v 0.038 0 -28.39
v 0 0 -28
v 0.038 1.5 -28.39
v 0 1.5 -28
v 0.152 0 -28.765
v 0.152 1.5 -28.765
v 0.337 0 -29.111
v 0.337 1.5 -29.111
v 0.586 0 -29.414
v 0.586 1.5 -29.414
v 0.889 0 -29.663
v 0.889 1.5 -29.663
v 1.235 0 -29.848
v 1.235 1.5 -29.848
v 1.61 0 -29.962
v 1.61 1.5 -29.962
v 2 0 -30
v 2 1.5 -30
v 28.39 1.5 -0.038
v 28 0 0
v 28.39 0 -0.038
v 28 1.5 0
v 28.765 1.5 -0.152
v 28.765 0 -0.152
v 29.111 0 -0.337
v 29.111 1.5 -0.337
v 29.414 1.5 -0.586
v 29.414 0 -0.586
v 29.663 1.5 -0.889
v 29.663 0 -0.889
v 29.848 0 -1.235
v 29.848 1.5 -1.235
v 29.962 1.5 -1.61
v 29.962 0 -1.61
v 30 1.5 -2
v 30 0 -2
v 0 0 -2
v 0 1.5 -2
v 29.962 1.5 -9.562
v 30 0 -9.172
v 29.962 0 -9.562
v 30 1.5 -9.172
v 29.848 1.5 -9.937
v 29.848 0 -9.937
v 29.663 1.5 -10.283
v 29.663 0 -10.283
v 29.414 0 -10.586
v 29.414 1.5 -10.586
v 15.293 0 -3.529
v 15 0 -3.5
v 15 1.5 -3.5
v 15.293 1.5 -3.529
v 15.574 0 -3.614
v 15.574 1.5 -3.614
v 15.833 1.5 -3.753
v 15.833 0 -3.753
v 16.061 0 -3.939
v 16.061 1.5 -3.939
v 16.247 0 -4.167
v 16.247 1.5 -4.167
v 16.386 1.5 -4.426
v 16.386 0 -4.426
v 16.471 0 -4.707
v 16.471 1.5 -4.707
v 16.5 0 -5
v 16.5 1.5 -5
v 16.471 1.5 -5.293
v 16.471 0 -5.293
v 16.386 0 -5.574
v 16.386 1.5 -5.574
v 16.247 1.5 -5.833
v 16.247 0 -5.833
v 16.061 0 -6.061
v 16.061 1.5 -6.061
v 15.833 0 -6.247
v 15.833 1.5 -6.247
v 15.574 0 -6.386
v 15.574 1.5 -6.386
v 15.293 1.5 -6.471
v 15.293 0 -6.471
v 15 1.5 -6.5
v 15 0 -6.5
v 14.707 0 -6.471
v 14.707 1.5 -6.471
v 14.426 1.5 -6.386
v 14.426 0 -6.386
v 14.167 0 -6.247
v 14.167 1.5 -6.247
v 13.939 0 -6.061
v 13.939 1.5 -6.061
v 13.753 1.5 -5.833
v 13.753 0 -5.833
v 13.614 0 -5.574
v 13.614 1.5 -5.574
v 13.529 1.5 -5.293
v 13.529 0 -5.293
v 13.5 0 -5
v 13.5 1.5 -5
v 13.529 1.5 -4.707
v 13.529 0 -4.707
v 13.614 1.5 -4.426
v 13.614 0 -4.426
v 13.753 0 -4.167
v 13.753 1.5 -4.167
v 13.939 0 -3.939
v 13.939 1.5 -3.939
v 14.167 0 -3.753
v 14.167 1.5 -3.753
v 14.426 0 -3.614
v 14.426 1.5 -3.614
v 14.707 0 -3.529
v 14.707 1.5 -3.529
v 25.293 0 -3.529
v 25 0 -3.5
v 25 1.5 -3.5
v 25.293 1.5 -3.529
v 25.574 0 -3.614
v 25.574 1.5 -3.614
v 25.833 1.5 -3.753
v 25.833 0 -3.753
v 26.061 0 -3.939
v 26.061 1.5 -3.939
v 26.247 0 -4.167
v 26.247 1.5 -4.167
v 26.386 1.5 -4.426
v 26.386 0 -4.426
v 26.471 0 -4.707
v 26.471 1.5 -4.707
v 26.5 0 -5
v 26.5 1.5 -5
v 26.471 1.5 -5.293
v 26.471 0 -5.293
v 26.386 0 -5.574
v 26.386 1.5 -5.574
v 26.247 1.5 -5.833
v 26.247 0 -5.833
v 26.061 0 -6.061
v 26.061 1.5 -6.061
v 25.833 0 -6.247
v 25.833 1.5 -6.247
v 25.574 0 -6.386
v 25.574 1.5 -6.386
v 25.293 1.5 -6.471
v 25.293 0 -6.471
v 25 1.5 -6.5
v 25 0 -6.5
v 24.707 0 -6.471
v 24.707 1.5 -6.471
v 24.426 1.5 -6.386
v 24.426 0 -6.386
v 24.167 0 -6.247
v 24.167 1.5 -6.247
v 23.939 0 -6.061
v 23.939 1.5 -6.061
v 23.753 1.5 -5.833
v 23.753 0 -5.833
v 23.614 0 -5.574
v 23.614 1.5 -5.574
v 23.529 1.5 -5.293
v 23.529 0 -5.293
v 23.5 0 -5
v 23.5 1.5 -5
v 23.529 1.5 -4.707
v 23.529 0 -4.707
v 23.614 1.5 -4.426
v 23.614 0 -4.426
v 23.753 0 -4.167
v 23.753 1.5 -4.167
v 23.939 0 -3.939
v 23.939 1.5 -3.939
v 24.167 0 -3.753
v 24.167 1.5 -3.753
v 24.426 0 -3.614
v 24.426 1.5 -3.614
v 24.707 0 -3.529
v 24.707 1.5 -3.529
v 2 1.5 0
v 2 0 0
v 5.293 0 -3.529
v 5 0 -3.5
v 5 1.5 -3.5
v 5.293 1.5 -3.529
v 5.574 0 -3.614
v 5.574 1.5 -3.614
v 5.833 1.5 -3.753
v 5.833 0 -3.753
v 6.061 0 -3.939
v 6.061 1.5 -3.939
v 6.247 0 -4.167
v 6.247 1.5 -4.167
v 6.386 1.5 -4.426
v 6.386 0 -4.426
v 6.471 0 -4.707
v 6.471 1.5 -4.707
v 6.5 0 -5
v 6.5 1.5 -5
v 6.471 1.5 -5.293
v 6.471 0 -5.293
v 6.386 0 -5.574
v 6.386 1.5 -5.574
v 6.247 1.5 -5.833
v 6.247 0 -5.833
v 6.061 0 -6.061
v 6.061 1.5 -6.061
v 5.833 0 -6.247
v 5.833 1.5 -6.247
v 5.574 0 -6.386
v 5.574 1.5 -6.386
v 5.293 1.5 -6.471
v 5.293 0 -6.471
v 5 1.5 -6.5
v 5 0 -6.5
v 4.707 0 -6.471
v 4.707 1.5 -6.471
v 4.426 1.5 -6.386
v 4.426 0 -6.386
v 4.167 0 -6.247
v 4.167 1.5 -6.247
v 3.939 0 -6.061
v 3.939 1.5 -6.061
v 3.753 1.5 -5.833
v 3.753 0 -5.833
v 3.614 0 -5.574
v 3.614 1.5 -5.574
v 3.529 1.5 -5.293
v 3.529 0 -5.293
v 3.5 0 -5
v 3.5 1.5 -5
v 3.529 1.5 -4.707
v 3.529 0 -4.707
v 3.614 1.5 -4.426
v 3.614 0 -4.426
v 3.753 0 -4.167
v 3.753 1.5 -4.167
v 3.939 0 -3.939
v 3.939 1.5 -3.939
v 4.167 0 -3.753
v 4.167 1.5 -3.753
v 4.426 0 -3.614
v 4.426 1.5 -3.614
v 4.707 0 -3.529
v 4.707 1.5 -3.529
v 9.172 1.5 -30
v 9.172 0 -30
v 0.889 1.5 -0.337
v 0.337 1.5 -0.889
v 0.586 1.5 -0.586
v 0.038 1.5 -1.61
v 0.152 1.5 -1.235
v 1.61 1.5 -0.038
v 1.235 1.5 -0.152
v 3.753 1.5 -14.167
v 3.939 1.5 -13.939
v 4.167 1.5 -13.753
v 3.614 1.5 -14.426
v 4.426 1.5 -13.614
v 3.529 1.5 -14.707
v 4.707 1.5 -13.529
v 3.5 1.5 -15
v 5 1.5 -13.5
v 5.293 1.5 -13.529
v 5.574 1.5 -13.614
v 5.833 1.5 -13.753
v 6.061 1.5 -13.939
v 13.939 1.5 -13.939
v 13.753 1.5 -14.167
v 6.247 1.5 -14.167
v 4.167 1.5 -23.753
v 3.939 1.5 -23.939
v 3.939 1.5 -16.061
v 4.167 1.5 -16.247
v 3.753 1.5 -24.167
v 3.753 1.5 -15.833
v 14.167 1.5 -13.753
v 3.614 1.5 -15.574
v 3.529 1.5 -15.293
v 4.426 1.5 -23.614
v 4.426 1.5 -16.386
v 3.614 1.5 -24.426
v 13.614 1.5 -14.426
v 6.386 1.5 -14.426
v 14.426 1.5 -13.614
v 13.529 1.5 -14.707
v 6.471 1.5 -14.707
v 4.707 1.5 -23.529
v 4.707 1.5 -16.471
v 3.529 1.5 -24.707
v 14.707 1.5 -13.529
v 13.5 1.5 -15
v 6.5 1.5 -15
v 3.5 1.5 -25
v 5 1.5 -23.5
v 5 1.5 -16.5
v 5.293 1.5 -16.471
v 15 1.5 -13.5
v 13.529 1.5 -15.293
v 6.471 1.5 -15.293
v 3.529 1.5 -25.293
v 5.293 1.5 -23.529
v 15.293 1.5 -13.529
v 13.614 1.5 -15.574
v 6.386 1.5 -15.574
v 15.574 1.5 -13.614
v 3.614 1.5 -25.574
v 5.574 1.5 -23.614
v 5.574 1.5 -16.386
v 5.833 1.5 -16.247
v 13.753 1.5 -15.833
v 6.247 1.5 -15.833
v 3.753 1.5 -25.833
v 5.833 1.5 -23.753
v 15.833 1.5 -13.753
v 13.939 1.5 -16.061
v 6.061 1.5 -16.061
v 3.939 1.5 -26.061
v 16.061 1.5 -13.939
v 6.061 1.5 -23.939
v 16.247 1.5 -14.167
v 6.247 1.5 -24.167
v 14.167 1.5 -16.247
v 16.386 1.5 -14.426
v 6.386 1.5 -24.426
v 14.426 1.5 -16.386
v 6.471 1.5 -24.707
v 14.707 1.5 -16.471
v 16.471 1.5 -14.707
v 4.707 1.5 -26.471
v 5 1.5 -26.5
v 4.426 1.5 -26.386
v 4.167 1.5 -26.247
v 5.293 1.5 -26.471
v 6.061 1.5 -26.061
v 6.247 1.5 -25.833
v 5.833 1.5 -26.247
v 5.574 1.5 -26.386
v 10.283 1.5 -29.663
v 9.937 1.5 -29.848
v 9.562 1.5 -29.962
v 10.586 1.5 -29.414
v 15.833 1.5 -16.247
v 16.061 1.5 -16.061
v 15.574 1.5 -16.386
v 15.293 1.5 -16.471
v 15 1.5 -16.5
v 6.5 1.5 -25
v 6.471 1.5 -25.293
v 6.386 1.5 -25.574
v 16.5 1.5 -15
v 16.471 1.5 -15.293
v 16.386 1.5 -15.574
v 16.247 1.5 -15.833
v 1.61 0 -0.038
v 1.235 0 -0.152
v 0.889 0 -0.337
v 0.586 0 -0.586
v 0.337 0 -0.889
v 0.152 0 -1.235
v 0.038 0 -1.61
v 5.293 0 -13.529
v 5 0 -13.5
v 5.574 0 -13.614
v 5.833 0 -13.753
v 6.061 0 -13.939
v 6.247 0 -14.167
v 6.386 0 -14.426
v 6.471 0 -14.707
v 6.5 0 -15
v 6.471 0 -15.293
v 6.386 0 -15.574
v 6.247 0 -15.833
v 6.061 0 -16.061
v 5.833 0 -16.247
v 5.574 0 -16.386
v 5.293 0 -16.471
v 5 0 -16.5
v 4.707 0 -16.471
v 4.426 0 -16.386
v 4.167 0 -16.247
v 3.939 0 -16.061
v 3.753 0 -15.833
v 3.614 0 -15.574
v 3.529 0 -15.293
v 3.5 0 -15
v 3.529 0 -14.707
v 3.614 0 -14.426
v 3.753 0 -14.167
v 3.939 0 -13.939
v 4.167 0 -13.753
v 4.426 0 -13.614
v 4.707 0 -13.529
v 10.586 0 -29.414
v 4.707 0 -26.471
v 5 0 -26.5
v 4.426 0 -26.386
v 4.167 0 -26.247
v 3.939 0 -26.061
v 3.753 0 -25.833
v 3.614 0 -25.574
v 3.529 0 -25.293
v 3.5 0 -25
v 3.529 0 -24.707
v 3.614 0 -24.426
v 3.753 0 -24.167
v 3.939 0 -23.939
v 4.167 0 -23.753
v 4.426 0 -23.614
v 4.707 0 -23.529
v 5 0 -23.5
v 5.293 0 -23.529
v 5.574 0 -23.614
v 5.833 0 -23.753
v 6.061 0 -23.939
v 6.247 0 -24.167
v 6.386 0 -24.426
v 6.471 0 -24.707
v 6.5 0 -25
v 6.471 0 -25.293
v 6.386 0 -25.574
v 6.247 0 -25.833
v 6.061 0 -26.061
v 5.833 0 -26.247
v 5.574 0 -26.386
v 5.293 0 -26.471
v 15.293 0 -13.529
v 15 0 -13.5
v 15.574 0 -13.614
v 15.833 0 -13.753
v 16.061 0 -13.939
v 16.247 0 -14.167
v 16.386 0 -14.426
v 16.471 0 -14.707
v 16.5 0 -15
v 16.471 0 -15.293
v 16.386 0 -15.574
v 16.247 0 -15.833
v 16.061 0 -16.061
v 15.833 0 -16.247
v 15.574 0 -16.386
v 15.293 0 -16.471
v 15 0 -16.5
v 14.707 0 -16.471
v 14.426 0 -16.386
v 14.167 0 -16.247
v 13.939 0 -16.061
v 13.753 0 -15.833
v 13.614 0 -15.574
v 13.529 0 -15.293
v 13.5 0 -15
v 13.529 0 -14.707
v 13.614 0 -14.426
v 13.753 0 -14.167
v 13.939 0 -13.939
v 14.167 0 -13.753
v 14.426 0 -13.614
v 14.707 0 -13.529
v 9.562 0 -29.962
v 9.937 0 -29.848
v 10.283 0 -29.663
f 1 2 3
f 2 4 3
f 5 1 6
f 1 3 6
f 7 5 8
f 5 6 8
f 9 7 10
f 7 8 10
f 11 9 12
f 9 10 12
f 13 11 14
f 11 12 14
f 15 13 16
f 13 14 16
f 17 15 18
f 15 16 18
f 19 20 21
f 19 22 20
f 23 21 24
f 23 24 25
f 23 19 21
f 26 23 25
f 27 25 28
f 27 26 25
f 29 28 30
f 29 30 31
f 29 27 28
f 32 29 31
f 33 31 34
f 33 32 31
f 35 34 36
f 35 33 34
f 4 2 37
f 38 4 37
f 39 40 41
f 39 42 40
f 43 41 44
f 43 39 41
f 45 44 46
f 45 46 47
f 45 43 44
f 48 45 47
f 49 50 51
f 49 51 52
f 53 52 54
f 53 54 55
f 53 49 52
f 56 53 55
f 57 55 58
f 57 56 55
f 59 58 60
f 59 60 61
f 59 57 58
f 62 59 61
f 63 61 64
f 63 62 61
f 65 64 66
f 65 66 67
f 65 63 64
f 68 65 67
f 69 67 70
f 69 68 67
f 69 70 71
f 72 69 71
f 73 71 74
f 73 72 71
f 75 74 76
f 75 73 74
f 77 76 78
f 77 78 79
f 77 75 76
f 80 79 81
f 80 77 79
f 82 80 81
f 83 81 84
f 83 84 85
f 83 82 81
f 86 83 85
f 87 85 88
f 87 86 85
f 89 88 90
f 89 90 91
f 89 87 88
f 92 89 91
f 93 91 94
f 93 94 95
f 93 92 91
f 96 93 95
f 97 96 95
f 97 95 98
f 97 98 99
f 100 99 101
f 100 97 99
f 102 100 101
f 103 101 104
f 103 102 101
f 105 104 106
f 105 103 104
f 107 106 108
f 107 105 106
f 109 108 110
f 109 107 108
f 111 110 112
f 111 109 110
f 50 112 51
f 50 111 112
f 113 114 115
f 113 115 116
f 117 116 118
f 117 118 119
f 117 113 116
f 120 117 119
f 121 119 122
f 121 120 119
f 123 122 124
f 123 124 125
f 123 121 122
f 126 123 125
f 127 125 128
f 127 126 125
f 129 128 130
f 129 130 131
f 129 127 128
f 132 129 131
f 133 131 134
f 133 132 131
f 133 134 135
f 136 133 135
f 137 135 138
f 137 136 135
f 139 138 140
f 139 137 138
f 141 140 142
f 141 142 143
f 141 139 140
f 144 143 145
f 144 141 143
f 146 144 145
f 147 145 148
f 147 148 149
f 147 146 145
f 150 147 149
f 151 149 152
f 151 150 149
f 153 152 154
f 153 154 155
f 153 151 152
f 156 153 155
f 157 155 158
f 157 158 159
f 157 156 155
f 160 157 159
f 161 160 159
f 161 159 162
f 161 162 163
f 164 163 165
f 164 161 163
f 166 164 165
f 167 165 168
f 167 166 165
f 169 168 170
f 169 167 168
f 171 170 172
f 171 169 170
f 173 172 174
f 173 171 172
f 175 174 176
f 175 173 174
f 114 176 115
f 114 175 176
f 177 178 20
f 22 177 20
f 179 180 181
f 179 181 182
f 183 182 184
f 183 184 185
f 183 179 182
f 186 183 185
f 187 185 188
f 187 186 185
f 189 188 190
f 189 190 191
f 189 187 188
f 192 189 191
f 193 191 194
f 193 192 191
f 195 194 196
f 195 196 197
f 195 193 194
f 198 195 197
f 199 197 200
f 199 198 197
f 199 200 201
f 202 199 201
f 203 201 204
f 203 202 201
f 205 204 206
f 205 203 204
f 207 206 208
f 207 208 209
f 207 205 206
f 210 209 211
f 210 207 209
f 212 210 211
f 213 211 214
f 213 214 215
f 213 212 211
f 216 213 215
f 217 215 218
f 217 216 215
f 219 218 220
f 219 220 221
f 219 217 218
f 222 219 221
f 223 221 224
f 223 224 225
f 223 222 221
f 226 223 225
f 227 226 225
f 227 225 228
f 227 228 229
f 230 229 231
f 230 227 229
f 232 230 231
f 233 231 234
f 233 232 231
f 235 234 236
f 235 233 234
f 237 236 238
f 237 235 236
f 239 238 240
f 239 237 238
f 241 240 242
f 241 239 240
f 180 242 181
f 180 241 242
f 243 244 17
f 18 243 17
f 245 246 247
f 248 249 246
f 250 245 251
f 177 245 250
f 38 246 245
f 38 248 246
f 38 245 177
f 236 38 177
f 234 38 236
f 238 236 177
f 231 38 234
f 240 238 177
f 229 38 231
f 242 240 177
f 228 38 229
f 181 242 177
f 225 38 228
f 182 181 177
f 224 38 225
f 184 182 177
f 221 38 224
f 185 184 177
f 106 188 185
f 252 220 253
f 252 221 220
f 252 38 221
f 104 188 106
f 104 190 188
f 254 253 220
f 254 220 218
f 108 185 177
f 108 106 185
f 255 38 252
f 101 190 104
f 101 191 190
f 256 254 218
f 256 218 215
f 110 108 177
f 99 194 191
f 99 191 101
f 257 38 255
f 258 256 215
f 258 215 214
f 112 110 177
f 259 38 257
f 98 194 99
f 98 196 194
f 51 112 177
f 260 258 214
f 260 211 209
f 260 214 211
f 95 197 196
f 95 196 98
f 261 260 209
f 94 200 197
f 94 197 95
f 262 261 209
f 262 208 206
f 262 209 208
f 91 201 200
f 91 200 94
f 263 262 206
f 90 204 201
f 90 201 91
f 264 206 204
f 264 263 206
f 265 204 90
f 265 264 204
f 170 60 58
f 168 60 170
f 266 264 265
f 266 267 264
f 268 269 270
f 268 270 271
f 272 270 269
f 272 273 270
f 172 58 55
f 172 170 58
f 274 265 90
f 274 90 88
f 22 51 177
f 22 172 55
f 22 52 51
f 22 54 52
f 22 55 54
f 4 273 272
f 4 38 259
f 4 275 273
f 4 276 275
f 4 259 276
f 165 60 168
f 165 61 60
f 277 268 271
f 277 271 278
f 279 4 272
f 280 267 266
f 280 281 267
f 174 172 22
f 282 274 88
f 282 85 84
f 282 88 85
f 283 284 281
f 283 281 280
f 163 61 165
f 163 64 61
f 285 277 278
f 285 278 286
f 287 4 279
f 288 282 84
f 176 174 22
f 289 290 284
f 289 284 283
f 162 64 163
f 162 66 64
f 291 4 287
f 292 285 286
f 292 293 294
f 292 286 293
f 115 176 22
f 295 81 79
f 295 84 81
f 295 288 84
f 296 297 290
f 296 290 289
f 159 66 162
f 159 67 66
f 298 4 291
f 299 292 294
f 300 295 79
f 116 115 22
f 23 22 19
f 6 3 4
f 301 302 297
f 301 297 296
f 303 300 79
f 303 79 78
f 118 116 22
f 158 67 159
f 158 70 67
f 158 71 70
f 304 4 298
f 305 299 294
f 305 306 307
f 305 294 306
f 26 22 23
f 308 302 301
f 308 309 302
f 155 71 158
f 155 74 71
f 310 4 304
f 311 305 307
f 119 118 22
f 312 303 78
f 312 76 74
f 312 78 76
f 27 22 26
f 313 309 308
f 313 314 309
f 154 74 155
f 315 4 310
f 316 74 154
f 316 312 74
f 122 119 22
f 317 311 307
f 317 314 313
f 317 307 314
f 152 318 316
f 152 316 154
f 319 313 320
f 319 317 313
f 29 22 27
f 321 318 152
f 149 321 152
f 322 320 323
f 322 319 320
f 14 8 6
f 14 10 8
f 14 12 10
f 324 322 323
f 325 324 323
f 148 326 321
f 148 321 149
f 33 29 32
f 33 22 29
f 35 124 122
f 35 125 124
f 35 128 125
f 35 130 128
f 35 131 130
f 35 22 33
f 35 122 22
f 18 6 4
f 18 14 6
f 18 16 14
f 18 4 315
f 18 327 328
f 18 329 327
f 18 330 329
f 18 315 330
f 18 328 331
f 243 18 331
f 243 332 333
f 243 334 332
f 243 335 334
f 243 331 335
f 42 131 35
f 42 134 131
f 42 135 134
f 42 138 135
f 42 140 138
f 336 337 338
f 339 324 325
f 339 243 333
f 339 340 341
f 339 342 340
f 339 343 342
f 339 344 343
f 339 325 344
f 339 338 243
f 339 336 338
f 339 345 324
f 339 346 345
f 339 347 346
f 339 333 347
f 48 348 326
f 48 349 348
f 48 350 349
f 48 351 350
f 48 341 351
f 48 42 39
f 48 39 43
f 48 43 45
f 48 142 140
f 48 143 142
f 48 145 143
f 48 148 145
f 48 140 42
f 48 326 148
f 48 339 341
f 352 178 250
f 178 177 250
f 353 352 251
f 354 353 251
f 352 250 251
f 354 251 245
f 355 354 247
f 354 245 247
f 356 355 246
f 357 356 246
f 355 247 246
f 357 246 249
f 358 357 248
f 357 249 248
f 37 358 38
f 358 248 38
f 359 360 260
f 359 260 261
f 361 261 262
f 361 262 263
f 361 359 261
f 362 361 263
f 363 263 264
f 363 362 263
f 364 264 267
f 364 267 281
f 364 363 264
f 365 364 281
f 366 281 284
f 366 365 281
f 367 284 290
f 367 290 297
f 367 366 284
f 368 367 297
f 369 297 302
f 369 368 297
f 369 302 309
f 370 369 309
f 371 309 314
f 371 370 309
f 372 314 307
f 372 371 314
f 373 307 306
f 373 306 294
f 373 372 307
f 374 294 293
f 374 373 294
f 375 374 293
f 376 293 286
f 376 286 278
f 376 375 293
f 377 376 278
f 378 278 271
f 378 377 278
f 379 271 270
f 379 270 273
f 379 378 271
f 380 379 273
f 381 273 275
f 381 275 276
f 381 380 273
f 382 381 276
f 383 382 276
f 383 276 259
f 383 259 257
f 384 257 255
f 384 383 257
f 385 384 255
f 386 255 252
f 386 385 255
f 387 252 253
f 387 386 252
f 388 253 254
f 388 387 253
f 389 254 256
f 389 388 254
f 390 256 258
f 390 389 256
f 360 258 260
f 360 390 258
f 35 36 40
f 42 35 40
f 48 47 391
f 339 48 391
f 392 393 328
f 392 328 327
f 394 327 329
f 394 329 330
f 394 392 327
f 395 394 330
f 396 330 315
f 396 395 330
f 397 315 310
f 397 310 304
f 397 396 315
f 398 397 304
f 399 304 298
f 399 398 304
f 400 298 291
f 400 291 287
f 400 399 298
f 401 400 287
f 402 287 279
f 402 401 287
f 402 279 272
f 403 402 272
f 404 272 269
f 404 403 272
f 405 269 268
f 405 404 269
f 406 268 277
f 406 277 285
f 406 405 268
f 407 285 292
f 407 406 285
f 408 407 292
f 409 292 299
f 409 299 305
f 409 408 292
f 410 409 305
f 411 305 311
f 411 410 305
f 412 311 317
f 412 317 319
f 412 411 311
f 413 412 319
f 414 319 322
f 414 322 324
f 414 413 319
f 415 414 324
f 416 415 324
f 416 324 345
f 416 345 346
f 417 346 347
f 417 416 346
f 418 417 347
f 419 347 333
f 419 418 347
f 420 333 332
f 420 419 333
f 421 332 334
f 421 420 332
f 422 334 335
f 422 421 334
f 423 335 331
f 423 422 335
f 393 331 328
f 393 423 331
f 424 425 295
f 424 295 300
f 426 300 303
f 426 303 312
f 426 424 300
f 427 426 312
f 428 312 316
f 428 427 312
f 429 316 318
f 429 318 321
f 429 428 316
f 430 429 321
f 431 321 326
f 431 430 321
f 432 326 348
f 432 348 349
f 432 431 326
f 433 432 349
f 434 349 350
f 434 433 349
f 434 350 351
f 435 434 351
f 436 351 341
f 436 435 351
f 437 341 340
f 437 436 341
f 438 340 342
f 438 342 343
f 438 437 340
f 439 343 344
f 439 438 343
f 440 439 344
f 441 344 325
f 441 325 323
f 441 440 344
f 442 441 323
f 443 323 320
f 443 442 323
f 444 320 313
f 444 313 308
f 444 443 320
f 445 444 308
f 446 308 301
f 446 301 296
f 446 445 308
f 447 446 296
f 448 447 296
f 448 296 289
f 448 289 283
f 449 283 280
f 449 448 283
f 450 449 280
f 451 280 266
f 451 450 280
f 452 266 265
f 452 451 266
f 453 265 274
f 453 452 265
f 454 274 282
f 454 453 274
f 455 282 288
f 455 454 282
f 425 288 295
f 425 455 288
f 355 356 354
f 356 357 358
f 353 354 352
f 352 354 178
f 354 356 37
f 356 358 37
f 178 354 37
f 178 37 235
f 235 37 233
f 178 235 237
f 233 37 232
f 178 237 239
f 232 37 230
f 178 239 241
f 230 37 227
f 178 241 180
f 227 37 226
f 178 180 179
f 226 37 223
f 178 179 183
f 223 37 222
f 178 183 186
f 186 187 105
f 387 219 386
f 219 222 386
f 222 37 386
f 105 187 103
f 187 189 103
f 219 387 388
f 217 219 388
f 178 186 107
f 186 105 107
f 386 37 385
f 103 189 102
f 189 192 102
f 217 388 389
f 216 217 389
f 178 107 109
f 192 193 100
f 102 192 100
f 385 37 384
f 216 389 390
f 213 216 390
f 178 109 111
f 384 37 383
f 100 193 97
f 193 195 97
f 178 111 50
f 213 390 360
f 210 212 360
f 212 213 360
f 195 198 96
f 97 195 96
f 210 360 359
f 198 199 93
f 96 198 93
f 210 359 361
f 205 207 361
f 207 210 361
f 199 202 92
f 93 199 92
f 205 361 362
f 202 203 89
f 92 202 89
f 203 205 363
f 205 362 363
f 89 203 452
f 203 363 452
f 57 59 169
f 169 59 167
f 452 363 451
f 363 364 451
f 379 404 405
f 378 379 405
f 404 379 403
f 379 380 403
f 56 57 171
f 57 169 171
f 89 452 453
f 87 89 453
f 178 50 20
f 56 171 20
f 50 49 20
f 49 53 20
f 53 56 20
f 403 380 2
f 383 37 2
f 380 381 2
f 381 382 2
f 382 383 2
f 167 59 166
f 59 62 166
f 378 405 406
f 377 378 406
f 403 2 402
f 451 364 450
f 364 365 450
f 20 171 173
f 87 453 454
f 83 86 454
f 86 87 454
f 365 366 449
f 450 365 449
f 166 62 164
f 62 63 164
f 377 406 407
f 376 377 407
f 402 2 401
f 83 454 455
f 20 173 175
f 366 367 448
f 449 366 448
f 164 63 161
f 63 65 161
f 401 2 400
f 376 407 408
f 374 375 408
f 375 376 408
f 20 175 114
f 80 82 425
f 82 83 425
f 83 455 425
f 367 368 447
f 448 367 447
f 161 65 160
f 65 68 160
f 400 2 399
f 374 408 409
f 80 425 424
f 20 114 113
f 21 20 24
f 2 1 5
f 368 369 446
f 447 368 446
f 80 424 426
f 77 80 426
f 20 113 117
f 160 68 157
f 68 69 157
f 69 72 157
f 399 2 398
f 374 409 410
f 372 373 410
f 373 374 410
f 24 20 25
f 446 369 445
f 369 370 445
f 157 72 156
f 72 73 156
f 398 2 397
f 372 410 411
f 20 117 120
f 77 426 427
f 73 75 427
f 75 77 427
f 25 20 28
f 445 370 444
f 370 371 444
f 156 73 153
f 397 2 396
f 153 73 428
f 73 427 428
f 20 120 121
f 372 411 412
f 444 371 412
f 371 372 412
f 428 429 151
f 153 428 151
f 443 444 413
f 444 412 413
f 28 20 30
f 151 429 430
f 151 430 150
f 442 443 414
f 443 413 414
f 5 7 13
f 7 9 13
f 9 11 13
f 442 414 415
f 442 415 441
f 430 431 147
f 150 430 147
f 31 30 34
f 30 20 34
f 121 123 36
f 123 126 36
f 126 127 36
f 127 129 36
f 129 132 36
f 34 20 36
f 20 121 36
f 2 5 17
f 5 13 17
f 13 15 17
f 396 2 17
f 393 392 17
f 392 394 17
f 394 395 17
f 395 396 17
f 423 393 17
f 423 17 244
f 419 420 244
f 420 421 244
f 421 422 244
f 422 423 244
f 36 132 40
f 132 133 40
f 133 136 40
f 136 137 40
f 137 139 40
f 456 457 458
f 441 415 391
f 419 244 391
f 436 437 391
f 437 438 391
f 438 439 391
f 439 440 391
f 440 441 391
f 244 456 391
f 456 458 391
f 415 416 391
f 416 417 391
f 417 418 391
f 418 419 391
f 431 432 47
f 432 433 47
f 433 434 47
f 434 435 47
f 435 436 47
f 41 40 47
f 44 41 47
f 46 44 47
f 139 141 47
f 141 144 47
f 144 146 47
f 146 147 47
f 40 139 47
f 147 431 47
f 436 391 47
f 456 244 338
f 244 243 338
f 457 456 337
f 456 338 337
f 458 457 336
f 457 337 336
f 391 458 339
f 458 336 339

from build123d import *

# Parameters (mm, degrees)
SKETCH_2_R      = 1.5
EXTRUDE_1_DEPTH = 1.5
FILLET_1_R      = 2


with BuildPart() as part:
    # ｽｹｯﾁ2 → ﾎﾞｽ - 押し出し1 (new body)
    with BuildSketch(Plane(origin=(0, 0, 0), x_dir=(1, 0, 0), z_dir=(0, 1, 0))):
        Polygon((0, 0), (30, 0), (30, 10), (10, 30), (0, 30), align=None)
        with Locations(Location((5, 5, 0), (0, 0, 270))):
            Circle(SKETCH_2_R, mode=Mode.SUBTRACT)
        with Locations(Location((25, 5, 0), (0, 0, 270))):
            Circle(SKETCH_2_R, mode=Mode.SUBTRACT)
        with Locations(Location((5, 25, 0), (0, 0, 90))):
            Circle(SKETCH_2_R, mode=Mode.SUBTRACT)
        with Locations(Location((5, 15, 0), (0, 0, 270))):
            Circle(SKETCH_2_R, mode=Mode.SUBTRACT)
        with Locations(Location((15, 5, 0), (0, 0, 270))):
            Circle(SKETCH_2_R, mode=Mode.SUBTRACT)
        with Locations(Location((15, 15, 0), (0, 0, 270))):
            Circle(SKETCH_2_R, mode=Mode.SUBTRACT)
    extrude(amount=EXTRUDE_1_DEPTH)

    # ﾌｨﾚｯﾄ1
    fillet_1_edges = [part.edges().sort_by_distance(p)[0] for p in [
        (0, 0.75, -30),
        (10, 0.75, -30),
        (30, 0.75, -10),
        (30, 0.75, 0),
        (0, 0.75, 0),
    ]]
    fillet(fillet_1_edges, radius=FILLET_1_R)


solid = part.part
